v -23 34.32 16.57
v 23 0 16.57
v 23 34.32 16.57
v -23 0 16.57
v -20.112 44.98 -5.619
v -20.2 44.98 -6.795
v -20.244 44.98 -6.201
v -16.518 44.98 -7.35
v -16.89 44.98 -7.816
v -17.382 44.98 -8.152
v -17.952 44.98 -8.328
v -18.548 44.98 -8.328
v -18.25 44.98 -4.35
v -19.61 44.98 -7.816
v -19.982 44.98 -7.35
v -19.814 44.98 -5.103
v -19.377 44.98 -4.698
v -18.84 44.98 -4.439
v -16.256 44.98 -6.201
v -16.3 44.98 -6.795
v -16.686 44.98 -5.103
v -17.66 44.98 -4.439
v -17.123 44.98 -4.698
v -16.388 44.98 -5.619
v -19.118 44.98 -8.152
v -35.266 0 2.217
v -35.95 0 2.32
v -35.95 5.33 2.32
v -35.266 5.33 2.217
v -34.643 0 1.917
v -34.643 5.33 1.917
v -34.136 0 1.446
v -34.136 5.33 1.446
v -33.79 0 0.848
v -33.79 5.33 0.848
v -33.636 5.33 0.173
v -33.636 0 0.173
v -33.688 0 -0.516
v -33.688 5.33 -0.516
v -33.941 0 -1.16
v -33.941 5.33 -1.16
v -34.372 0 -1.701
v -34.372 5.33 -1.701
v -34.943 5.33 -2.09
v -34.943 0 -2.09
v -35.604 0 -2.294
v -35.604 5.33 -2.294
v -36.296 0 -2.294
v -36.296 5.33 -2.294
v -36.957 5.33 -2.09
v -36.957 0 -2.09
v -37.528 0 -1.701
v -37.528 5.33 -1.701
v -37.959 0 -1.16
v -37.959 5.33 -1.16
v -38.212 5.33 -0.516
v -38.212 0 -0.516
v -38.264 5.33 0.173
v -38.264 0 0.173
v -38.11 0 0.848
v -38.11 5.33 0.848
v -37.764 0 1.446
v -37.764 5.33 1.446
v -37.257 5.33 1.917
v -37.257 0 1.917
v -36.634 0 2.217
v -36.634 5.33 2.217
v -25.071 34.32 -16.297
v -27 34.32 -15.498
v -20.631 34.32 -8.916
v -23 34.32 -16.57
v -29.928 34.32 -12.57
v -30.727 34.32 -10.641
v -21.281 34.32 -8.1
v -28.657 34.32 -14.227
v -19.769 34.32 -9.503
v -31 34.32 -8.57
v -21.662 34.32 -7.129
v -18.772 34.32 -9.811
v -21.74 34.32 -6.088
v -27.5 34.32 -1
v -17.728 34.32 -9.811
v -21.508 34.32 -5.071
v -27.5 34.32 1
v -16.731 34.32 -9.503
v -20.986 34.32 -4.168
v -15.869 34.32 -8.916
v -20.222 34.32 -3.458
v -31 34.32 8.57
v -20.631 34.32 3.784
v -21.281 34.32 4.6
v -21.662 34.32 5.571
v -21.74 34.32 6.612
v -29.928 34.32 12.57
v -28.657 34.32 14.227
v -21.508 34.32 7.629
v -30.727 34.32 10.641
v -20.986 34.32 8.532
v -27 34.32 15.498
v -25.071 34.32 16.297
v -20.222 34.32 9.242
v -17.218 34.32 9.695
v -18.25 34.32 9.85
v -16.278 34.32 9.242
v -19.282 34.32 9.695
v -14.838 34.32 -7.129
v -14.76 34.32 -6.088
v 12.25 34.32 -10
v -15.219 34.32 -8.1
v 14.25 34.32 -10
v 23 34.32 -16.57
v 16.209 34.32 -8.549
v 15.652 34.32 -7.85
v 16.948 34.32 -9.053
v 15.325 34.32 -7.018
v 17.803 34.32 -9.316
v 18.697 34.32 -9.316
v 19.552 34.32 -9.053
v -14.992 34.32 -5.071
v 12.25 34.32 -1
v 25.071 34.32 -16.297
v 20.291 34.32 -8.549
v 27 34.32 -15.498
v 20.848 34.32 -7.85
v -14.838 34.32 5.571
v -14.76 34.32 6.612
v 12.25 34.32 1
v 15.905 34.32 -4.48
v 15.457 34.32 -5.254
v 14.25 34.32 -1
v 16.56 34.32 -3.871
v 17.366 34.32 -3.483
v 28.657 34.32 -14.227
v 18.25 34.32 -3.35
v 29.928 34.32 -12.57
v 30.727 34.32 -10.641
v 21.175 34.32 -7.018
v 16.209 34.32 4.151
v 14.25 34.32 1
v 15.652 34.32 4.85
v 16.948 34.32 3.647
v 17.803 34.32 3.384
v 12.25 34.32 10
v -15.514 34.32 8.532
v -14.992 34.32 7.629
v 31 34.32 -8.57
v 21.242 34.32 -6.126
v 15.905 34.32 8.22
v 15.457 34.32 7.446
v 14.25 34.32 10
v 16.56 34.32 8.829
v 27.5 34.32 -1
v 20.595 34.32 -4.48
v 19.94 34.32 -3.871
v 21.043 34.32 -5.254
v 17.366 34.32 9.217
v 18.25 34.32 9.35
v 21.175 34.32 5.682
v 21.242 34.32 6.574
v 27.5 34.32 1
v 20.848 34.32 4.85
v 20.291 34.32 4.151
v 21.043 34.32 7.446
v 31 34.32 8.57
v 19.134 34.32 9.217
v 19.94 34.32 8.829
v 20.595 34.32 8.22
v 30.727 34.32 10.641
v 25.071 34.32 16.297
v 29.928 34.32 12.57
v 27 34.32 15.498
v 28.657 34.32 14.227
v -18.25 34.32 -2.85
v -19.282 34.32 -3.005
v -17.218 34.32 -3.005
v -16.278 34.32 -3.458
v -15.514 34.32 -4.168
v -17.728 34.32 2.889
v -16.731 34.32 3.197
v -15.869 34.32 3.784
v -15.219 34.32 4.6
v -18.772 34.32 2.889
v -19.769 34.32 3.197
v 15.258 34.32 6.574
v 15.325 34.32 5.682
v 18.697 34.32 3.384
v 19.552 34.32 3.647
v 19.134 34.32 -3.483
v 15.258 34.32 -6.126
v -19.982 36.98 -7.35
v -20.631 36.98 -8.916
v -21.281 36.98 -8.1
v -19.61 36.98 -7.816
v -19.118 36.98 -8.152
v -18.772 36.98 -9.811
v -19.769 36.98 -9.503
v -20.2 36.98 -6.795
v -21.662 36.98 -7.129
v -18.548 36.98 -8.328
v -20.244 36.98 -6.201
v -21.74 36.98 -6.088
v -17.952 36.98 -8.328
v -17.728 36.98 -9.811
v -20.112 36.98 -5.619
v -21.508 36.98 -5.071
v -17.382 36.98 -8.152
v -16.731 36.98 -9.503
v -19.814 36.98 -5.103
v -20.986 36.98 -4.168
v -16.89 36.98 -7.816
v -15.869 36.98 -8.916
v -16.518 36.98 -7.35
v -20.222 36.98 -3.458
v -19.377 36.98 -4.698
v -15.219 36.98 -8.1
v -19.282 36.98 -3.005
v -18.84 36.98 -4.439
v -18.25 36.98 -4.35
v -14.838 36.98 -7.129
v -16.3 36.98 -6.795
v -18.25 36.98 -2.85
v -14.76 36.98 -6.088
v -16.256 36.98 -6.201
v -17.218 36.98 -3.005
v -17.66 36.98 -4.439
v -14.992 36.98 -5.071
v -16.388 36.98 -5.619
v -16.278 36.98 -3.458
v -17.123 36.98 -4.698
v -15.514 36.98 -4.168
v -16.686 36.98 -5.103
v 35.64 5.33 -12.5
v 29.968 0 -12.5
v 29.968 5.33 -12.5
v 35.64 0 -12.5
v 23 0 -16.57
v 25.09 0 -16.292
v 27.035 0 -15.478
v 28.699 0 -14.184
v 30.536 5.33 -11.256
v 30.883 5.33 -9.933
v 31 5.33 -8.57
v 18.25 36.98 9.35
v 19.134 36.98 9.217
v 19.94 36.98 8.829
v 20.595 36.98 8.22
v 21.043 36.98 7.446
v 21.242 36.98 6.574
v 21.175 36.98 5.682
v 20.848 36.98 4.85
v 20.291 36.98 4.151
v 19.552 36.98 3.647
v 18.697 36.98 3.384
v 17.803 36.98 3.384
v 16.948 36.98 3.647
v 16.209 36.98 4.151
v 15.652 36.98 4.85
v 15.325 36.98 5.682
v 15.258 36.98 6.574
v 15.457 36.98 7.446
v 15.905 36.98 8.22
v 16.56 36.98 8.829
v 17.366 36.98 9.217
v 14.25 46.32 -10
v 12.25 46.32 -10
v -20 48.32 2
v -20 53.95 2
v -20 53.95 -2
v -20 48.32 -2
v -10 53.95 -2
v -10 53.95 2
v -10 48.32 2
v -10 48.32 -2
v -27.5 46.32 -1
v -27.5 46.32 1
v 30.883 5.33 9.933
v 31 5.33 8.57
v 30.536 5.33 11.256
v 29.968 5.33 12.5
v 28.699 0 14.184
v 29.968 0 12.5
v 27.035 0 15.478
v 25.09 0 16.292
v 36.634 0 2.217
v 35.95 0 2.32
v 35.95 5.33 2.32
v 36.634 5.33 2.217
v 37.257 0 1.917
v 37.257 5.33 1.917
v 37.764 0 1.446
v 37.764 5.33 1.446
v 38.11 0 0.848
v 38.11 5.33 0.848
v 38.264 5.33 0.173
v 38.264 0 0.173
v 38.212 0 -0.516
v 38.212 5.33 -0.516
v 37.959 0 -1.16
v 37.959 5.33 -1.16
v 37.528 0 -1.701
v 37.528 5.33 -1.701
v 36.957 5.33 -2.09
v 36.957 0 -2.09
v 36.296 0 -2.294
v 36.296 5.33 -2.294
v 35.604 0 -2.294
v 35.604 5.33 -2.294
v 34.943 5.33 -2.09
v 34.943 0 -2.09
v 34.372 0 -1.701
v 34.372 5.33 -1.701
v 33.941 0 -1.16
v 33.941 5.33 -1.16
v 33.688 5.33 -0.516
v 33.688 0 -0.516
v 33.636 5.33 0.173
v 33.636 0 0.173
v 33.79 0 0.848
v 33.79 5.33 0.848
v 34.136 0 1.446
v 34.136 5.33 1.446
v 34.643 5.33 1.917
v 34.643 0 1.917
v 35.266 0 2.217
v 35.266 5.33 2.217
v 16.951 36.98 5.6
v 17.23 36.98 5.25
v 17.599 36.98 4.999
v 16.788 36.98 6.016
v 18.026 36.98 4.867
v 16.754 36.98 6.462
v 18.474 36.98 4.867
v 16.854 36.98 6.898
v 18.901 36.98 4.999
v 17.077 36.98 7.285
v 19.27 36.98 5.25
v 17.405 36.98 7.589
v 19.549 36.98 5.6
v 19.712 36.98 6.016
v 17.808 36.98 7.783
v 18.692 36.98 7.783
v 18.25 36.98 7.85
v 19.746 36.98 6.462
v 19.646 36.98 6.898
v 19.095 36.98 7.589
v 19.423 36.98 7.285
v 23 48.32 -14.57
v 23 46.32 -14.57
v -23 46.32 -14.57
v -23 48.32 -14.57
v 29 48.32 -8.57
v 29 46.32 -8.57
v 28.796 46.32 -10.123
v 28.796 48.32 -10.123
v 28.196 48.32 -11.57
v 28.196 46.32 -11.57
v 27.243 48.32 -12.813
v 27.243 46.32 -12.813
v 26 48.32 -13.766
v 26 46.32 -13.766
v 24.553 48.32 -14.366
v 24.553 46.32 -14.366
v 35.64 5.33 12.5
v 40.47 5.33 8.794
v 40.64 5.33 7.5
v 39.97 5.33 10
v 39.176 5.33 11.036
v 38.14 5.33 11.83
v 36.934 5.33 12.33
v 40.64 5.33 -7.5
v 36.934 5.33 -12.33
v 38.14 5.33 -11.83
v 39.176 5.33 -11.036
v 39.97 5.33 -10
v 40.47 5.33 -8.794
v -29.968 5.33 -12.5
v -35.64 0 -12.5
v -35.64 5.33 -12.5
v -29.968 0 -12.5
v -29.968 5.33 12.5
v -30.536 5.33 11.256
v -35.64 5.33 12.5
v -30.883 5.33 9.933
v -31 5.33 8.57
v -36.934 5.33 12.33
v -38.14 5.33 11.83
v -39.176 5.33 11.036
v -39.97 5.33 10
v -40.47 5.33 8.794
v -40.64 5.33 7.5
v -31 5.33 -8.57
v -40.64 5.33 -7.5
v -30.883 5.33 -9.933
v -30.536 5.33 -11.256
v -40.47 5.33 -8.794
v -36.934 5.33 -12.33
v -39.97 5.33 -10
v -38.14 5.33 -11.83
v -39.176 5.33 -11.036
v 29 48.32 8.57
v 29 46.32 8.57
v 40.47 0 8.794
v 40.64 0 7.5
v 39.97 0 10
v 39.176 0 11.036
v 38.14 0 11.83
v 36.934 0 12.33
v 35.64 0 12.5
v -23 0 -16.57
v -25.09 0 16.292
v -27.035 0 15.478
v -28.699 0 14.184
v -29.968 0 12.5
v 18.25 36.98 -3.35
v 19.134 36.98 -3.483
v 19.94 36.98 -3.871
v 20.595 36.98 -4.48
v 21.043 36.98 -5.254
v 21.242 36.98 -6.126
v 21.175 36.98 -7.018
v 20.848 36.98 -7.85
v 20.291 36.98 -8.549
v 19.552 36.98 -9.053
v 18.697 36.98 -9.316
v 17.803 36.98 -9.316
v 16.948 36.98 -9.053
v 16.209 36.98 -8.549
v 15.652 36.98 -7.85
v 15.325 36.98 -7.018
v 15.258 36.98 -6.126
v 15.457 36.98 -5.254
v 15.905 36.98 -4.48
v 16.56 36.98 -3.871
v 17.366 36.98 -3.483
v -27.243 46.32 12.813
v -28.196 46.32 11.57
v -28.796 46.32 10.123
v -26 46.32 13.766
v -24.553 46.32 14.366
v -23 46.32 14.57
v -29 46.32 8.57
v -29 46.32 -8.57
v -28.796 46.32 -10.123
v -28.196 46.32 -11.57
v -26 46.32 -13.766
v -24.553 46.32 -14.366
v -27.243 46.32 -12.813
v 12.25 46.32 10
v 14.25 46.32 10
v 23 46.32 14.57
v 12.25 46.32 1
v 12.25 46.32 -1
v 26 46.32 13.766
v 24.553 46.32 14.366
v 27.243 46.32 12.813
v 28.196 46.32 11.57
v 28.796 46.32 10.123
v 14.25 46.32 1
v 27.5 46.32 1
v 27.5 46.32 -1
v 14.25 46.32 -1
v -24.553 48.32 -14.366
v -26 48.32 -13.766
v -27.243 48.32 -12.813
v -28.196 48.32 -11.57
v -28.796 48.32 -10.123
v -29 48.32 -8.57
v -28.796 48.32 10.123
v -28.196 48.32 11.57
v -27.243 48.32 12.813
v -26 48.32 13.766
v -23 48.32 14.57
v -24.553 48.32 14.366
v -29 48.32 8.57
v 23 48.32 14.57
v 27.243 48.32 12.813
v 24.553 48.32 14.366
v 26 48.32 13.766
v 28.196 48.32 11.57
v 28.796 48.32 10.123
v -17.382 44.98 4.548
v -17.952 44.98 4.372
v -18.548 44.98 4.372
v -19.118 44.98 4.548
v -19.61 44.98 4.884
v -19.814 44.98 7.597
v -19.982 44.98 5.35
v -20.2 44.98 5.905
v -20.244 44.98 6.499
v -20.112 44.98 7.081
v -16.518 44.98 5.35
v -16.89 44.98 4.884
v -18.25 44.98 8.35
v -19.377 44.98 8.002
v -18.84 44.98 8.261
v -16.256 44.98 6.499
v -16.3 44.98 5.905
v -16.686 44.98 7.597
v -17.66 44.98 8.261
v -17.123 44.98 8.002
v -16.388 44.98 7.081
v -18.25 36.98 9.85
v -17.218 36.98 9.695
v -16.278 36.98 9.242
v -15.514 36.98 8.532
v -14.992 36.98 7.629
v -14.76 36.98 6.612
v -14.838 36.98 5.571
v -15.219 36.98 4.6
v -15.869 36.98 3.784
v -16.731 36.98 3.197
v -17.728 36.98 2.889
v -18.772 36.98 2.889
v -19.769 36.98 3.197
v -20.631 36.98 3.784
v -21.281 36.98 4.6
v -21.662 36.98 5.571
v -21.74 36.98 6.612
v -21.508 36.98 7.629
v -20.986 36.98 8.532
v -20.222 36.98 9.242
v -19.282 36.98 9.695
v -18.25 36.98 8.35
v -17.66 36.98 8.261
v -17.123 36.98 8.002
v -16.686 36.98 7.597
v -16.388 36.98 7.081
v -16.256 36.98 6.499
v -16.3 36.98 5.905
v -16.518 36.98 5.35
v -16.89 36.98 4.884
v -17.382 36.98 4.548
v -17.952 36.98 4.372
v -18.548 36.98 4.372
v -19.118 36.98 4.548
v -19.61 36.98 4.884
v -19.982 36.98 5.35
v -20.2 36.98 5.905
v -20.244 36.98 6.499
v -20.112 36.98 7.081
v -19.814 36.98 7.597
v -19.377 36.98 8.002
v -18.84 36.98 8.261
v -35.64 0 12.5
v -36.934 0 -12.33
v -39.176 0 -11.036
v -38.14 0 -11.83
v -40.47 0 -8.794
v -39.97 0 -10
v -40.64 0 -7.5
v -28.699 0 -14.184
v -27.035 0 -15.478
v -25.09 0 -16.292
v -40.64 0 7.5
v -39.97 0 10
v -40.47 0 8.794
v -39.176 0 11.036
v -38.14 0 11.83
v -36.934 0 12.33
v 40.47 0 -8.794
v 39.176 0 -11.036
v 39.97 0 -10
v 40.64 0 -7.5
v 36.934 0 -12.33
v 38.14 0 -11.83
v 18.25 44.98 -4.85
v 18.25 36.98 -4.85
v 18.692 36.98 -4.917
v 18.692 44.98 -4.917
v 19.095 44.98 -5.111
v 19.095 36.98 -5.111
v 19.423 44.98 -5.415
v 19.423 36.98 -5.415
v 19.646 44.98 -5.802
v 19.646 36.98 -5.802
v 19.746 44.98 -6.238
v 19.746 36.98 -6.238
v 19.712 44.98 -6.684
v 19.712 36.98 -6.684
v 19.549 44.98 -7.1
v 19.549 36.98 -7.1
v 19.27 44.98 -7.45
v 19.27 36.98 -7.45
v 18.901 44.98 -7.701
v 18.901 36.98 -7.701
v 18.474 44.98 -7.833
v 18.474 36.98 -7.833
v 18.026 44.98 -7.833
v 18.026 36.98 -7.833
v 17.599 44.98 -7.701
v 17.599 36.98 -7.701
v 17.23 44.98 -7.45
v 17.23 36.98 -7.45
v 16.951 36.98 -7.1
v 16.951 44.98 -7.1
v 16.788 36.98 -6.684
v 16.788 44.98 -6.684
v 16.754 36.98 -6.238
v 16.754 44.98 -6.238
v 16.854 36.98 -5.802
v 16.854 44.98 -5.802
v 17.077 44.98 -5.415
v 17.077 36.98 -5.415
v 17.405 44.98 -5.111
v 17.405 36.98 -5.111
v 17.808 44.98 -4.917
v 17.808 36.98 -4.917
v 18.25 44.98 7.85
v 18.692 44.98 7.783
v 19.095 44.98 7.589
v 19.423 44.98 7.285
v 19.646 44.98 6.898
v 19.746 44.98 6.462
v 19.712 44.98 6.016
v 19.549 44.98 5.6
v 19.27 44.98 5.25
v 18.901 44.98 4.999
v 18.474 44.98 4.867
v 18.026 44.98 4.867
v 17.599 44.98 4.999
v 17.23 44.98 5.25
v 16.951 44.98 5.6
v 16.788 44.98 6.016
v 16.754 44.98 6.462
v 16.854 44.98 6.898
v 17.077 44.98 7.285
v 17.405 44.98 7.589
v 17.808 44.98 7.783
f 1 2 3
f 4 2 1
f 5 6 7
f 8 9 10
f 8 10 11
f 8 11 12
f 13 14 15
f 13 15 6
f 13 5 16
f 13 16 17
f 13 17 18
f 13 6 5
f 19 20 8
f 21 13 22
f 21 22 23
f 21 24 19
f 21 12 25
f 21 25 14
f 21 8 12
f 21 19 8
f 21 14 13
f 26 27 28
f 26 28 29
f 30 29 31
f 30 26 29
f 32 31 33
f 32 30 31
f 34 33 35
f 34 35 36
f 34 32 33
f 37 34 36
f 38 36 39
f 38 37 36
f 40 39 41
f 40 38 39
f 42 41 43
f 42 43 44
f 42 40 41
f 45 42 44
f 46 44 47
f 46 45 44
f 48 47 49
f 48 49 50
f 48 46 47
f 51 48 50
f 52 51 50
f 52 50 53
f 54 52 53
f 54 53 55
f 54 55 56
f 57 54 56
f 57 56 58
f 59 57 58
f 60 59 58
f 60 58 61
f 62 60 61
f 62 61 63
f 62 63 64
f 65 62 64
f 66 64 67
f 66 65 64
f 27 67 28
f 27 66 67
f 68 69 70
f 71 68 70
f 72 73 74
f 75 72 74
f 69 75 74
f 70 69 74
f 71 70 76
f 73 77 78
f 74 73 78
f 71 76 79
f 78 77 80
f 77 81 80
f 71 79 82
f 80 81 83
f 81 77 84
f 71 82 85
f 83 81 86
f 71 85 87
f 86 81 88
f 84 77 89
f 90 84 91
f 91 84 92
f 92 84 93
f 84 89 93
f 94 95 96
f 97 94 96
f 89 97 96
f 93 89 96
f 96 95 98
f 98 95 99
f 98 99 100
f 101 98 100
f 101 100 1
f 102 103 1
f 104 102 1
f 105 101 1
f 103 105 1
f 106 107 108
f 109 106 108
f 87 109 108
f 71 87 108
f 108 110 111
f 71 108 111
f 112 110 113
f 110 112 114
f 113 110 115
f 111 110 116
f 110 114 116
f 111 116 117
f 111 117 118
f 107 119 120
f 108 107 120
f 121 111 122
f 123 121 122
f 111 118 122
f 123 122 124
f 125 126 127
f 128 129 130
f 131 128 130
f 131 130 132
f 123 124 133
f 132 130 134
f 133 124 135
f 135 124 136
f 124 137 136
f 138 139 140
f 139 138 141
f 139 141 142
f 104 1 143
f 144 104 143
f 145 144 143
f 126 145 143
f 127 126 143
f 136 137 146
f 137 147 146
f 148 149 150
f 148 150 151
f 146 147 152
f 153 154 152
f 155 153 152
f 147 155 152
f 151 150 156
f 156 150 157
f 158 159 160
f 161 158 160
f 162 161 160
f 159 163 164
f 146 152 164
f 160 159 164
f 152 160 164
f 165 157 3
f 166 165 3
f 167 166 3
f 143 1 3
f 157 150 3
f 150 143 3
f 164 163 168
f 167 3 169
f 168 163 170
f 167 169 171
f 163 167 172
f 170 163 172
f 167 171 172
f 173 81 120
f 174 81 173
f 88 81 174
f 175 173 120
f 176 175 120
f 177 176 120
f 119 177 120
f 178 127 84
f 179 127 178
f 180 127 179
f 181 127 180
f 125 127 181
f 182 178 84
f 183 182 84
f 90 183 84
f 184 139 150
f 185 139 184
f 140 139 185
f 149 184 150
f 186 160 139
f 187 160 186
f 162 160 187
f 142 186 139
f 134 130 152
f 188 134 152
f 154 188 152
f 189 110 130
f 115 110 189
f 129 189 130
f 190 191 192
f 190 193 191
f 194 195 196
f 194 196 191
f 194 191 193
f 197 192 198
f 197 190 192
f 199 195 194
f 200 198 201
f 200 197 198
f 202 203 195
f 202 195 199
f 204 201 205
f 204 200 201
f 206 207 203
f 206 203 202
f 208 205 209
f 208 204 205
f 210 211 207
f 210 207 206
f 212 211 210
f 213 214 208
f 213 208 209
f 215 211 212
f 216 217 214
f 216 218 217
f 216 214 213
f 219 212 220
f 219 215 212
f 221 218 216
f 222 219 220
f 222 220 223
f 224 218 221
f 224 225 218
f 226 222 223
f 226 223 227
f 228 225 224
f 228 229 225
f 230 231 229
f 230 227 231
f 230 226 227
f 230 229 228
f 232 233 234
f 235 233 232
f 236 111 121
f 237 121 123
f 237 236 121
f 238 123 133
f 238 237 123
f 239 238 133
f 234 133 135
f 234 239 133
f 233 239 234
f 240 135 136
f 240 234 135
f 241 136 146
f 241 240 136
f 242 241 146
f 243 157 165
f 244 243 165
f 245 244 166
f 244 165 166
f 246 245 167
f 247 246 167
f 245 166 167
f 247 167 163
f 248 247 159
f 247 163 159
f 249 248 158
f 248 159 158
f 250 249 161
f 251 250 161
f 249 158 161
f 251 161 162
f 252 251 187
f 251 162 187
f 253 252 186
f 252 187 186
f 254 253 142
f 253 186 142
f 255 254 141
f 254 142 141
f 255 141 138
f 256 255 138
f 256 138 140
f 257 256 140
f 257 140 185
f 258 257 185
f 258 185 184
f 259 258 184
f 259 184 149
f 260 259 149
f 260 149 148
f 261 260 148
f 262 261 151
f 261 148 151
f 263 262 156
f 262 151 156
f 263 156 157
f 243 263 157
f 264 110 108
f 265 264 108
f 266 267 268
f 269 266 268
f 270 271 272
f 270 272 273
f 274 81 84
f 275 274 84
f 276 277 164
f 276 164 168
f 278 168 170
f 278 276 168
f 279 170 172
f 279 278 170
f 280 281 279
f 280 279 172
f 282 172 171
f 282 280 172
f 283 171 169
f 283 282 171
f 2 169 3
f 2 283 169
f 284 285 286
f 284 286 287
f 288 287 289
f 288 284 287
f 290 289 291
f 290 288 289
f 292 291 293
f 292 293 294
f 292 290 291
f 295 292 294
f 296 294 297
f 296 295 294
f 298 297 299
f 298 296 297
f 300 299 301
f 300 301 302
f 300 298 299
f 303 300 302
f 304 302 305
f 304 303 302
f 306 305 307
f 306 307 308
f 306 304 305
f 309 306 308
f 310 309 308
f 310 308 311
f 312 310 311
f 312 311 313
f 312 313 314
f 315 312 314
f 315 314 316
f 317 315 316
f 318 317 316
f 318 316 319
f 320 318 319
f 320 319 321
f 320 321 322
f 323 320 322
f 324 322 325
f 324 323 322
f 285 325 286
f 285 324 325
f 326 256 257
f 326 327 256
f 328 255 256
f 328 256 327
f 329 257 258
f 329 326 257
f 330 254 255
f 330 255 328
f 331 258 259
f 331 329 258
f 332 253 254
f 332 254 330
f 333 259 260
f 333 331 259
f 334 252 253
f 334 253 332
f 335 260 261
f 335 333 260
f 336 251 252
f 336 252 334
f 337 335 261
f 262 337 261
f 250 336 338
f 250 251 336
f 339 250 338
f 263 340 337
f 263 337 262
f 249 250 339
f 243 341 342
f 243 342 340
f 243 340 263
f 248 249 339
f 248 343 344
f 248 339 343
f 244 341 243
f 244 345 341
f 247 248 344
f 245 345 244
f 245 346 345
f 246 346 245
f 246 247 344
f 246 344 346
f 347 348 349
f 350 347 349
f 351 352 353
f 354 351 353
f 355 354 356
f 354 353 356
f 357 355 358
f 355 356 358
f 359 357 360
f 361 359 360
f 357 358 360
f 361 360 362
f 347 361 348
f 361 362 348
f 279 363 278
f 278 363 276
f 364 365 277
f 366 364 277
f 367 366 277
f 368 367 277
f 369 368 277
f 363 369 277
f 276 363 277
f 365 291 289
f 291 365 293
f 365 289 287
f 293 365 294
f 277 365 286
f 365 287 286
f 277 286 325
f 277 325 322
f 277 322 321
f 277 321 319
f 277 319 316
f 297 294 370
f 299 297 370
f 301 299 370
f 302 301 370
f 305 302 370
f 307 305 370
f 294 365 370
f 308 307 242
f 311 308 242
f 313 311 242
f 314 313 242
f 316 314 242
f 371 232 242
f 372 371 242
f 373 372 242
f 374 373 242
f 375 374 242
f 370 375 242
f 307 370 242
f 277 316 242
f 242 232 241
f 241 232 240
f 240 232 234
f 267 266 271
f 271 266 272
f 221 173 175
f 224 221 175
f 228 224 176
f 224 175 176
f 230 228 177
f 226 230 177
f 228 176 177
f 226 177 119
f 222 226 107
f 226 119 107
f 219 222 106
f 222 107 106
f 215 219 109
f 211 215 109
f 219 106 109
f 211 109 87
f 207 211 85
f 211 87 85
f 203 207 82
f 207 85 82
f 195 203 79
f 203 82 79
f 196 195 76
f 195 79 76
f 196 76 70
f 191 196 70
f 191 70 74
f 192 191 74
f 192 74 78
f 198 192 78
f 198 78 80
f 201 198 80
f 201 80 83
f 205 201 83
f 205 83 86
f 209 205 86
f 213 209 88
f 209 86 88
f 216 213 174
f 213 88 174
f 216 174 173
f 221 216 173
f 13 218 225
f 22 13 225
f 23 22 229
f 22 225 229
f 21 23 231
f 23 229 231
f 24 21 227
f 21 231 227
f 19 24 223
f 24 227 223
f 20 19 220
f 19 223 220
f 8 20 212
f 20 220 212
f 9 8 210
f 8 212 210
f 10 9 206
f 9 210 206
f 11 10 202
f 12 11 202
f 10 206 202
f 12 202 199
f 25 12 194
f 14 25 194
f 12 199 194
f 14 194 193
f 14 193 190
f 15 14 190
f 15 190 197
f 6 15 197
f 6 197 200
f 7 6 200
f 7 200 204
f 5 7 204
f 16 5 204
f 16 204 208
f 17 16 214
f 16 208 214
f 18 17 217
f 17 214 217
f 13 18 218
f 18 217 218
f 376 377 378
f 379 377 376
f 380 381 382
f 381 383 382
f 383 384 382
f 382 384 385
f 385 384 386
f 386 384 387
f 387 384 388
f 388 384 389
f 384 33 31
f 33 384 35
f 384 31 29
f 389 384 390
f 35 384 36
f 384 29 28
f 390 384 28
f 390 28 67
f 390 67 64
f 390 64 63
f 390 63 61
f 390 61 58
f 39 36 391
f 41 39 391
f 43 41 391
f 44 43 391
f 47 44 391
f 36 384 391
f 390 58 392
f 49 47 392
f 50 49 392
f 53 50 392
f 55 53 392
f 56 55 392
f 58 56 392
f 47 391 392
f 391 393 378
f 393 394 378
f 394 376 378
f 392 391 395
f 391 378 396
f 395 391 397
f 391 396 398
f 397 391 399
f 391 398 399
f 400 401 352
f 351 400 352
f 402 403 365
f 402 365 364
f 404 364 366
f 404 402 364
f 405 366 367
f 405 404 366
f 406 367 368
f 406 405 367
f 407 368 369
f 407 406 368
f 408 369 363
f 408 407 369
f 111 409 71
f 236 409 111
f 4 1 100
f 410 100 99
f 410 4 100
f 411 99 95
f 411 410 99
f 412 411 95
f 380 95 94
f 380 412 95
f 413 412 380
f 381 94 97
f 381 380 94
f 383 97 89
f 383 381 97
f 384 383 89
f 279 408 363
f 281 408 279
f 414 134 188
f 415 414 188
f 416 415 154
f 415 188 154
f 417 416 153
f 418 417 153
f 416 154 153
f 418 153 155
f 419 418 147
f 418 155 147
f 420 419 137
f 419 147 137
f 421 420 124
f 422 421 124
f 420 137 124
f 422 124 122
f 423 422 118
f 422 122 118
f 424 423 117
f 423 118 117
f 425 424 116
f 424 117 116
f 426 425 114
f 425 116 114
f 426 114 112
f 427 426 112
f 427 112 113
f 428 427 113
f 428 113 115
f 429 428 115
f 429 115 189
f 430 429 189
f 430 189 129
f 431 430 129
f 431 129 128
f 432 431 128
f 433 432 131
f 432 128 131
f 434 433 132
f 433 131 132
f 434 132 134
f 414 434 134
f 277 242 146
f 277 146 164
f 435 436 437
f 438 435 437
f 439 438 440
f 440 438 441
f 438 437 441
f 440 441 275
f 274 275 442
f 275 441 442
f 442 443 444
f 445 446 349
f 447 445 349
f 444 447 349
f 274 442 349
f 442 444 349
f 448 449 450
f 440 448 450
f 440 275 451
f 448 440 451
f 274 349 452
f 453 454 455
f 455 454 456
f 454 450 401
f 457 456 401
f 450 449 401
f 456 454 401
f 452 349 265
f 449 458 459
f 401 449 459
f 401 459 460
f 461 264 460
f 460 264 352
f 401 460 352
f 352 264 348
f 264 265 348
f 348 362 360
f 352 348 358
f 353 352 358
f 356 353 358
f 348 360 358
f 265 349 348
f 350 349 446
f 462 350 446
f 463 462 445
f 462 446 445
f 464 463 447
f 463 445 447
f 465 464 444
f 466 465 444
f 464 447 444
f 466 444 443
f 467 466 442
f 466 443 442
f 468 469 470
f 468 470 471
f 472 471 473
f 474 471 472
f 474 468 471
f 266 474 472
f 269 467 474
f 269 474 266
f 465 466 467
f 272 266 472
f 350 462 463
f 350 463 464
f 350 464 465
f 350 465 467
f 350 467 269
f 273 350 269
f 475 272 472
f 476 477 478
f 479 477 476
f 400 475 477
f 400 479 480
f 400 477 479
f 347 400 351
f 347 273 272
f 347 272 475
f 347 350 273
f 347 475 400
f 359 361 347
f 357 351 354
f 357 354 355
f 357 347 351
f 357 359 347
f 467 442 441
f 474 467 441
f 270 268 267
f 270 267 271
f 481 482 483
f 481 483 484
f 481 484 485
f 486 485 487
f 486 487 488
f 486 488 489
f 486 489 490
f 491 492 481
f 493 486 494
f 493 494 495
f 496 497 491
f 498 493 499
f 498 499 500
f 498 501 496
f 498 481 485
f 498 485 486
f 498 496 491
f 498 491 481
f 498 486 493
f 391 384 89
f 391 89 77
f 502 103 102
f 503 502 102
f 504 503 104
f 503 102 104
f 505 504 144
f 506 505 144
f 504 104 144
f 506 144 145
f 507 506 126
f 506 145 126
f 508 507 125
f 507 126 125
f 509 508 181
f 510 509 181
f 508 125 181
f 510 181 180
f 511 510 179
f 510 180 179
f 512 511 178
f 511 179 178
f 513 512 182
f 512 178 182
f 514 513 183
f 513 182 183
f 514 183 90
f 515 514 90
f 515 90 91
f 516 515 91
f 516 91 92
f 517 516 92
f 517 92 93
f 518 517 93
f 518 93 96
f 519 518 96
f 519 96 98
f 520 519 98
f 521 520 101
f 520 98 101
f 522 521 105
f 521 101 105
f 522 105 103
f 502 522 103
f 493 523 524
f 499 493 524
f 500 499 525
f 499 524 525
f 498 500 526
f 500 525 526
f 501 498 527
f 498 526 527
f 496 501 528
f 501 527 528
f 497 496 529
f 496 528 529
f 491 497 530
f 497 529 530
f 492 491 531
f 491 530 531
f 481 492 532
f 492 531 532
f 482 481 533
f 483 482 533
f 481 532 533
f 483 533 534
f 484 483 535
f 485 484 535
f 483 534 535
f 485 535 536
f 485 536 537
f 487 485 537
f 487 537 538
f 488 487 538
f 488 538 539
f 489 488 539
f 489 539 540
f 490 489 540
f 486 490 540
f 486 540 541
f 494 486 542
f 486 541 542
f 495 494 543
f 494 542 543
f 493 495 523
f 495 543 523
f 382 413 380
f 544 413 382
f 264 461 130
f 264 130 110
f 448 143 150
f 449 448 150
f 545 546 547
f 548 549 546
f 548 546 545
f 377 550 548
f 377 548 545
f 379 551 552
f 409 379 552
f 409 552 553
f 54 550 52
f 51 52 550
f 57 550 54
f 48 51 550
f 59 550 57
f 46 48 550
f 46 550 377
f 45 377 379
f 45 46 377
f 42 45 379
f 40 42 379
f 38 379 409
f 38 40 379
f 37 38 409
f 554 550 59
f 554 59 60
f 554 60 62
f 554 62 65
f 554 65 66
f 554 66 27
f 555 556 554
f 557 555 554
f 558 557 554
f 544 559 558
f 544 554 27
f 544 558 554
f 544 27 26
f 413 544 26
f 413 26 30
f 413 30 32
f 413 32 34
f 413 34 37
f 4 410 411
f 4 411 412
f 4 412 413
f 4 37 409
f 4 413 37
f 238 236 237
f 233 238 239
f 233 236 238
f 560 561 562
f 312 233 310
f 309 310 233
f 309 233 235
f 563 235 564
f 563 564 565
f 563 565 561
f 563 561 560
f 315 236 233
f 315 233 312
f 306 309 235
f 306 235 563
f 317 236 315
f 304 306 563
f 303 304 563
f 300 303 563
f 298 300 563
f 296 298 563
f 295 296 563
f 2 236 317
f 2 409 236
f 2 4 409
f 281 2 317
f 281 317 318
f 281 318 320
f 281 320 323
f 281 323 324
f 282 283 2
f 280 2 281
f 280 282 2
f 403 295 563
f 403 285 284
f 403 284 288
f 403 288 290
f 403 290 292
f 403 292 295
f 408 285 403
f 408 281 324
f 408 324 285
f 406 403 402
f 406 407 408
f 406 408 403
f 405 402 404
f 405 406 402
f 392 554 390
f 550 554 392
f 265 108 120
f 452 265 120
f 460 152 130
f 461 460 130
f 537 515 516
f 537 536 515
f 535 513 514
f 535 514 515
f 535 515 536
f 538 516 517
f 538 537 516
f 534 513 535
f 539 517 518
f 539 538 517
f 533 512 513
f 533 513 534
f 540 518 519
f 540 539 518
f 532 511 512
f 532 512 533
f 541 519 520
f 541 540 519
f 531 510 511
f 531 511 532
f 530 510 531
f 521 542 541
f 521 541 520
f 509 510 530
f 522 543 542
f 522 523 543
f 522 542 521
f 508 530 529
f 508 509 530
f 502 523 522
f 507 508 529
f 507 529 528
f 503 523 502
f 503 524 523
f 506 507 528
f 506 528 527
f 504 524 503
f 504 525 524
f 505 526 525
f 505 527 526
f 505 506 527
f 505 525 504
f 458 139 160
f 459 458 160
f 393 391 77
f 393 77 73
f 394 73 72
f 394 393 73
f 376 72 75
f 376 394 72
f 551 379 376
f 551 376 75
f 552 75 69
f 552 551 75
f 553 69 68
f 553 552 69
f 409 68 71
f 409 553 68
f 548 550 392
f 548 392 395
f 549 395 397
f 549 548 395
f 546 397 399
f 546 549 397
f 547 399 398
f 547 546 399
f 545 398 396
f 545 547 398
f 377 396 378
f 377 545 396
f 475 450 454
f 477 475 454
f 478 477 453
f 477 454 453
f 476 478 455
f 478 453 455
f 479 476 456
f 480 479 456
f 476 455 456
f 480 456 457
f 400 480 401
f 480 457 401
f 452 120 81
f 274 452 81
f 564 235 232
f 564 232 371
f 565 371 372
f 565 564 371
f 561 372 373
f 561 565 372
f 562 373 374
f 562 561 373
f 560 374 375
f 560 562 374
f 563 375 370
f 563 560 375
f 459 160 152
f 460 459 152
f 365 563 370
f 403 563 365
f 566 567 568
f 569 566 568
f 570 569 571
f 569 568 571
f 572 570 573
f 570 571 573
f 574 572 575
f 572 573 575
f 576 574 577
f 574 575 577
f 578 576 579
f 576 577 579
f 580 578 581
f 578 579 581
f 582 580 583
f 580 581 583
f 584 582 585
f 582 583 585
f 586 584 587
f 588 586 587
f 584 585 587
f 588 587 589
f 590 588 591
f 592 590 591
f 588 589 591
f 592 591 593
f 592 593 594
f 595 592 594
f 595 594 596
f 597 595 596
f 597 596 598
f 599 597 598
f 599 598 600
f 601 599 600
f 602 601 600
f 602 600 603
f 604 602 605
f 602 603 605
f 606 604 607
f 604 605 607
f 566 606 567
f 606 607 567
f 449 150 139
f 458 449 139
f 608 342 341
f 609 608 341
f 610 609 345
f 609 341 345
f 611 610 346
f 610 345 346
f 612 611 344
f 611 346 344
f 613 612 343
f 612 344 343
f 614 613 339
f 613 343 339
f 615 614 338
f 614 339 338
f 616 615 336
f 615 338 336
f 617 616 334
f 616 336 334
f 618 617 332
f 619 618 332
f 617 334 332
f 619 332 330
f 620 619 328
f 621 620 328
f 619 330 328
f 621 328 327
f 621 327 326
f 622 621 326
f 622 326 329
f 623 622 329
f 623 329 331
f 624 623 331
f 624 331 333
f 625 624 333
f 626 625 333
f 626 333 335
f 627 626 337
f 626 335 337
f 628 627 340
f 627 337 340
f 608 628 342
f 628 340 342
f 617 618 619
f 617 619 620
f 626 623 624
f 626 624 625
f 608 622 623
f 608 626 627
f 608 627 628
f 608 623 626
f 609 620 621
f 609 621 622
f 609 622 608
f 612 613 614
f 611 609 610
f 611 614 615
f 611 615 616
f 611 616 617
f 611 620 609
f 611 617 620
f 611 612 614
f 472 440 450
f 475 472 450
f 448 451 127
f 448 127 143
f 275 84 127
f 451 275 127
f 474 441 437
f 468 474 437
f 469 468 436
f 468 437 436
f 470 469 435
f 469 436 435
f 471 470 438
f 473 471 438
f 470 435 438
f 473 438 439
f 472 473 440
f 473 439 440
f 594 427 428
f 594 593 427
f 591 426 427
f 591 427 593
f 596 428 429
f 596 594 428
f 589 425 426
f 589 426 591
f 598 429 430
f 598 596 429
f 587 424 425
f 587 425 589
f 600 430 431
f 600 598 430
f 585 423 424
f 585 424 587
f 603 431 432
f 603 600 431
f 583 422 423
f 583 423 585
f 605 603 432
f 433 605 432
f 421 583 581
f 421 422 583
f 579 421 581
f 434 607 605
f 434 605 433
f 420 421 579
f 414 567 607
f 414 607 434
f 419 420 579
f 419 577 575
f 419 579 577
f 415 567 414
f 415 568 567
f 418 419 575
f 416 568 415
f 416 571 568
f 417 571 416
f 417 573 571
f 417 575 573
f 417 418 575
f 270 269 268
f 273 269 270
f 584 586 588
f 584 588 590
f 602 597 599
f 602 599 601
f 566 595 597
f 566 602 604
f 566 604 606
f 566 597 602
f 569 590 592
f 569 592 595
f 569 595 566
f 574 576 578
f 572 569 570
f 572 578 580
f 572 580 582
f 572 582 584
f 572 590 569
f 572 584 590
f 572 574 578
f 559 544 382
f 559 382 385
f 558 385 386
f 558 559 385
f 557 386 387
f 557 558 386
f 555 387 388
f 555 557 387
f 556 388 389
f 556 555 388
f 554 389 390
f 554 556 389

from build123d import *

# Parameters (mm, degrees)
SKETCH1_R           = 2.32
BOSS_EXTRUDE1_DEPTH = 5.33
BOSS_EXTRUDE2_DEPTH = 34.32
SKETCH3_R           = 3.5
SKETCH3_R_2         = 3
BOSS_EXTRUDE3_DEPTH = 2.66
SKETCH4_R           = 2
SKETCH4_R_2         = 1.5
BOSS_EXTRUDE4_DEPTH = 8
BOSS_EXTRUDE5_DEPTH = 12
BOSS_EXTRUDE6_DEPTH = 2
SKETCH7_W           = 10
SKETCH7_H           = 4
BOSS_EXTRUDE7_DEPTH = 5.63


with BuildPart() as part:
    # Sketch1 → Boss-Extrude1 (new body)
    with BuildSketch(Plane(origin=(0, 0, 0), x_dir=(1, 0, 0), z_dir=(0, 1, 0))):
        with BuildLine():
            Line((35.64, -12.5), (-35.64, -12.5))
            ThreePointArc((-35.64, -12.5), (-39.175533906, -11.035533906), (-40.64, -7.5))
            Line((-40.64, -7.5), (-40.64, 7.5))
            ThreePointArc((-40.64, 7.5), (-39.175533906, 11.035533906), (-35.64, 12.5))
            Line((-35.64, 12.5), (35.64, 12.5))
            ThreePointArc((35.64, 12.5), (39.175533906, 11.035533906), (40.64, 7.5))
            Line((40.64, 7.5), (40.64, -7.5))
            ThreePointArc((40.64, -7.5), (39.175533906, -11.035533906), (35.64, -12.5))
        make_face()
        with Locations(Location((-35.95, 0, 0), (0, 0, 270))):
            Circle(SKETCH1_R, mode=Mode.SUBTRACT)
        with Locations(Location((35.95, 0, 0), (0, 0, 270))):
            Circle(SKETCH1_R, mode=Mode.SUBTRACT)
    extrude(amount=BOSS_EXTRUDE1_DEPTH)

    # Sketch2 → Boss-Extrude2 (add)
    with BuildSketch(Plane.XZ):
        with BuildLine():
            Line((23, 16.57), (-23, 16.57))
            ThreePointArc((-23, 16.57), (-28.656854249, 14.226854249), (-31, 8.57))
            Line((-31, 8.57), (-31, -8.57))
            ThreePointArc((-31, -8.57), (-28.656854249, -14.226854249), (-23, -16.57))
            Line((-23, -16.57), (23, -16.57))
            ThreePointArc((23, -16.57), (28.656854249, -14.226854249), (31, -8.57))
            Line((31, -8.57), (31, 8.57))
            ThreePointArc((31, 8.57), (28.656854249, 14.226854249), (23, 16.57))
        make_face()
    extrude(amount=-BOSS_EXTRUDE2_DEPTH)

    # Sketch3 → Boss-Extrude3 (add)
    with BuildSketch(Plane(origin=(0, 34.32, 0), x_dir=(1, 0, 0), z_dir=(0, 1, 0))):
        with Locations(Location((-18.25, 6.35, 0), (0, 0, 270))):
            Circle(SKETCH3_R)
        with Locations(Location((-18.25, -6.35, 0), (0, 0, 270))):
            Circle(SKETCH3_R)
        with Locations(Location((18.25, -6.35, 0), (0, 0, 270))):
            Circle(SKETCH3_R_2)
        with Locations(Location((18.25, 6.35, 0), (0, 0, 270))):
            Circle(SKETCH3_R_2)
    extrude(amount=BOSS_EXTRUDE3_DEPTH)

    # Sketch4 → Boss-Extrude4 (add)
    with BuildSketch(Plane(origin=(0, 36.98, 0), x_dir=(1, 0, 0), z_dir=(0, 1, 0))):
        with Locations(Location((-18.25, 6.35, 0), (0, 0, 270))):
            Circle(SKETCH4_R)
        with Locations(Location((-18.25, -6.35, 0), (0, 0, 270))):
            Circle(SKETCH4_R)
        with Locations(Location((18.25, 6.35, 0), (0, 0, 270))):
            Circle(SKETCH4_R_2)
        with Locations(Location((18.25, -6.35, 0), (0, 0, 270))):
            Circle(SKETCH4_R_2)
    extrude(amount=BOSS_EXTRUDE4_DEPTH)

    # Sketch5 → Boss-Extrude5 (add)
    with BuildSketch(Plane(origin=(0, 34.32, 0), x_dir=(1, 0, 0), z_dir=(0, 1, 0))):
        Polygon((12.25, 1), (-27.5, 1), (-27.5, -1), (12.25, -1), (12.25, -10), (14.25, -10), (14.25, -1), (27.5, -1), (27.5, 1), (14.25, 1), (14.25, 10), (12.25, 10), align=None)
    extrude(amount=BOSS_EXTRUDE5_DEPTH)

    # Sketch6 → Boss-Extrude6 (add)
    with BuildSketch(Plane(origin=(0, 46.32, 0), x_dir=(1, 0, 0), z_dir=(0, 1, 0))):
        with BuildLine():
            Line((-29, 8.57), (-29, -8.57))
            ThreePointArc((-29, -8.57), (-27.242640687, -12.812640687), (-23, -14.57))
            Line((-23, -14.57), (23, -14.57))
            ThreePointArc((23, -14.57), (27.242640687, -12.812640687), (29, -8.57))
            Line((29, -8.57), (29, 8.57))
            ThreePointArc((29, 8.57), (27.242640687, 12.812640687), (23, 14.57))
            Line((23, 14.57), (-23, 14.57))
            ThreePointArc((-23, 14.57), (-27.242640687, 12.812640687), (-29, 8.57))
        make_face()
    extrude(amount=BOSS_EXTRUDE6_DEPTH)

    # Sketch7 → Boss-Extrude7 (add)
    with BuildSketch(Plane(origin=(0, 48.32, 0), x_dir=(1, 0, 0), z_dir=(0, 1, 0))):
        with Locations((-15, 0)):
            Rectangle(SKETCH7_W, SKETCH7_H)
    extrude(amount=BOSS_EXTRUDE7_DEPTH)


solid = part.part
